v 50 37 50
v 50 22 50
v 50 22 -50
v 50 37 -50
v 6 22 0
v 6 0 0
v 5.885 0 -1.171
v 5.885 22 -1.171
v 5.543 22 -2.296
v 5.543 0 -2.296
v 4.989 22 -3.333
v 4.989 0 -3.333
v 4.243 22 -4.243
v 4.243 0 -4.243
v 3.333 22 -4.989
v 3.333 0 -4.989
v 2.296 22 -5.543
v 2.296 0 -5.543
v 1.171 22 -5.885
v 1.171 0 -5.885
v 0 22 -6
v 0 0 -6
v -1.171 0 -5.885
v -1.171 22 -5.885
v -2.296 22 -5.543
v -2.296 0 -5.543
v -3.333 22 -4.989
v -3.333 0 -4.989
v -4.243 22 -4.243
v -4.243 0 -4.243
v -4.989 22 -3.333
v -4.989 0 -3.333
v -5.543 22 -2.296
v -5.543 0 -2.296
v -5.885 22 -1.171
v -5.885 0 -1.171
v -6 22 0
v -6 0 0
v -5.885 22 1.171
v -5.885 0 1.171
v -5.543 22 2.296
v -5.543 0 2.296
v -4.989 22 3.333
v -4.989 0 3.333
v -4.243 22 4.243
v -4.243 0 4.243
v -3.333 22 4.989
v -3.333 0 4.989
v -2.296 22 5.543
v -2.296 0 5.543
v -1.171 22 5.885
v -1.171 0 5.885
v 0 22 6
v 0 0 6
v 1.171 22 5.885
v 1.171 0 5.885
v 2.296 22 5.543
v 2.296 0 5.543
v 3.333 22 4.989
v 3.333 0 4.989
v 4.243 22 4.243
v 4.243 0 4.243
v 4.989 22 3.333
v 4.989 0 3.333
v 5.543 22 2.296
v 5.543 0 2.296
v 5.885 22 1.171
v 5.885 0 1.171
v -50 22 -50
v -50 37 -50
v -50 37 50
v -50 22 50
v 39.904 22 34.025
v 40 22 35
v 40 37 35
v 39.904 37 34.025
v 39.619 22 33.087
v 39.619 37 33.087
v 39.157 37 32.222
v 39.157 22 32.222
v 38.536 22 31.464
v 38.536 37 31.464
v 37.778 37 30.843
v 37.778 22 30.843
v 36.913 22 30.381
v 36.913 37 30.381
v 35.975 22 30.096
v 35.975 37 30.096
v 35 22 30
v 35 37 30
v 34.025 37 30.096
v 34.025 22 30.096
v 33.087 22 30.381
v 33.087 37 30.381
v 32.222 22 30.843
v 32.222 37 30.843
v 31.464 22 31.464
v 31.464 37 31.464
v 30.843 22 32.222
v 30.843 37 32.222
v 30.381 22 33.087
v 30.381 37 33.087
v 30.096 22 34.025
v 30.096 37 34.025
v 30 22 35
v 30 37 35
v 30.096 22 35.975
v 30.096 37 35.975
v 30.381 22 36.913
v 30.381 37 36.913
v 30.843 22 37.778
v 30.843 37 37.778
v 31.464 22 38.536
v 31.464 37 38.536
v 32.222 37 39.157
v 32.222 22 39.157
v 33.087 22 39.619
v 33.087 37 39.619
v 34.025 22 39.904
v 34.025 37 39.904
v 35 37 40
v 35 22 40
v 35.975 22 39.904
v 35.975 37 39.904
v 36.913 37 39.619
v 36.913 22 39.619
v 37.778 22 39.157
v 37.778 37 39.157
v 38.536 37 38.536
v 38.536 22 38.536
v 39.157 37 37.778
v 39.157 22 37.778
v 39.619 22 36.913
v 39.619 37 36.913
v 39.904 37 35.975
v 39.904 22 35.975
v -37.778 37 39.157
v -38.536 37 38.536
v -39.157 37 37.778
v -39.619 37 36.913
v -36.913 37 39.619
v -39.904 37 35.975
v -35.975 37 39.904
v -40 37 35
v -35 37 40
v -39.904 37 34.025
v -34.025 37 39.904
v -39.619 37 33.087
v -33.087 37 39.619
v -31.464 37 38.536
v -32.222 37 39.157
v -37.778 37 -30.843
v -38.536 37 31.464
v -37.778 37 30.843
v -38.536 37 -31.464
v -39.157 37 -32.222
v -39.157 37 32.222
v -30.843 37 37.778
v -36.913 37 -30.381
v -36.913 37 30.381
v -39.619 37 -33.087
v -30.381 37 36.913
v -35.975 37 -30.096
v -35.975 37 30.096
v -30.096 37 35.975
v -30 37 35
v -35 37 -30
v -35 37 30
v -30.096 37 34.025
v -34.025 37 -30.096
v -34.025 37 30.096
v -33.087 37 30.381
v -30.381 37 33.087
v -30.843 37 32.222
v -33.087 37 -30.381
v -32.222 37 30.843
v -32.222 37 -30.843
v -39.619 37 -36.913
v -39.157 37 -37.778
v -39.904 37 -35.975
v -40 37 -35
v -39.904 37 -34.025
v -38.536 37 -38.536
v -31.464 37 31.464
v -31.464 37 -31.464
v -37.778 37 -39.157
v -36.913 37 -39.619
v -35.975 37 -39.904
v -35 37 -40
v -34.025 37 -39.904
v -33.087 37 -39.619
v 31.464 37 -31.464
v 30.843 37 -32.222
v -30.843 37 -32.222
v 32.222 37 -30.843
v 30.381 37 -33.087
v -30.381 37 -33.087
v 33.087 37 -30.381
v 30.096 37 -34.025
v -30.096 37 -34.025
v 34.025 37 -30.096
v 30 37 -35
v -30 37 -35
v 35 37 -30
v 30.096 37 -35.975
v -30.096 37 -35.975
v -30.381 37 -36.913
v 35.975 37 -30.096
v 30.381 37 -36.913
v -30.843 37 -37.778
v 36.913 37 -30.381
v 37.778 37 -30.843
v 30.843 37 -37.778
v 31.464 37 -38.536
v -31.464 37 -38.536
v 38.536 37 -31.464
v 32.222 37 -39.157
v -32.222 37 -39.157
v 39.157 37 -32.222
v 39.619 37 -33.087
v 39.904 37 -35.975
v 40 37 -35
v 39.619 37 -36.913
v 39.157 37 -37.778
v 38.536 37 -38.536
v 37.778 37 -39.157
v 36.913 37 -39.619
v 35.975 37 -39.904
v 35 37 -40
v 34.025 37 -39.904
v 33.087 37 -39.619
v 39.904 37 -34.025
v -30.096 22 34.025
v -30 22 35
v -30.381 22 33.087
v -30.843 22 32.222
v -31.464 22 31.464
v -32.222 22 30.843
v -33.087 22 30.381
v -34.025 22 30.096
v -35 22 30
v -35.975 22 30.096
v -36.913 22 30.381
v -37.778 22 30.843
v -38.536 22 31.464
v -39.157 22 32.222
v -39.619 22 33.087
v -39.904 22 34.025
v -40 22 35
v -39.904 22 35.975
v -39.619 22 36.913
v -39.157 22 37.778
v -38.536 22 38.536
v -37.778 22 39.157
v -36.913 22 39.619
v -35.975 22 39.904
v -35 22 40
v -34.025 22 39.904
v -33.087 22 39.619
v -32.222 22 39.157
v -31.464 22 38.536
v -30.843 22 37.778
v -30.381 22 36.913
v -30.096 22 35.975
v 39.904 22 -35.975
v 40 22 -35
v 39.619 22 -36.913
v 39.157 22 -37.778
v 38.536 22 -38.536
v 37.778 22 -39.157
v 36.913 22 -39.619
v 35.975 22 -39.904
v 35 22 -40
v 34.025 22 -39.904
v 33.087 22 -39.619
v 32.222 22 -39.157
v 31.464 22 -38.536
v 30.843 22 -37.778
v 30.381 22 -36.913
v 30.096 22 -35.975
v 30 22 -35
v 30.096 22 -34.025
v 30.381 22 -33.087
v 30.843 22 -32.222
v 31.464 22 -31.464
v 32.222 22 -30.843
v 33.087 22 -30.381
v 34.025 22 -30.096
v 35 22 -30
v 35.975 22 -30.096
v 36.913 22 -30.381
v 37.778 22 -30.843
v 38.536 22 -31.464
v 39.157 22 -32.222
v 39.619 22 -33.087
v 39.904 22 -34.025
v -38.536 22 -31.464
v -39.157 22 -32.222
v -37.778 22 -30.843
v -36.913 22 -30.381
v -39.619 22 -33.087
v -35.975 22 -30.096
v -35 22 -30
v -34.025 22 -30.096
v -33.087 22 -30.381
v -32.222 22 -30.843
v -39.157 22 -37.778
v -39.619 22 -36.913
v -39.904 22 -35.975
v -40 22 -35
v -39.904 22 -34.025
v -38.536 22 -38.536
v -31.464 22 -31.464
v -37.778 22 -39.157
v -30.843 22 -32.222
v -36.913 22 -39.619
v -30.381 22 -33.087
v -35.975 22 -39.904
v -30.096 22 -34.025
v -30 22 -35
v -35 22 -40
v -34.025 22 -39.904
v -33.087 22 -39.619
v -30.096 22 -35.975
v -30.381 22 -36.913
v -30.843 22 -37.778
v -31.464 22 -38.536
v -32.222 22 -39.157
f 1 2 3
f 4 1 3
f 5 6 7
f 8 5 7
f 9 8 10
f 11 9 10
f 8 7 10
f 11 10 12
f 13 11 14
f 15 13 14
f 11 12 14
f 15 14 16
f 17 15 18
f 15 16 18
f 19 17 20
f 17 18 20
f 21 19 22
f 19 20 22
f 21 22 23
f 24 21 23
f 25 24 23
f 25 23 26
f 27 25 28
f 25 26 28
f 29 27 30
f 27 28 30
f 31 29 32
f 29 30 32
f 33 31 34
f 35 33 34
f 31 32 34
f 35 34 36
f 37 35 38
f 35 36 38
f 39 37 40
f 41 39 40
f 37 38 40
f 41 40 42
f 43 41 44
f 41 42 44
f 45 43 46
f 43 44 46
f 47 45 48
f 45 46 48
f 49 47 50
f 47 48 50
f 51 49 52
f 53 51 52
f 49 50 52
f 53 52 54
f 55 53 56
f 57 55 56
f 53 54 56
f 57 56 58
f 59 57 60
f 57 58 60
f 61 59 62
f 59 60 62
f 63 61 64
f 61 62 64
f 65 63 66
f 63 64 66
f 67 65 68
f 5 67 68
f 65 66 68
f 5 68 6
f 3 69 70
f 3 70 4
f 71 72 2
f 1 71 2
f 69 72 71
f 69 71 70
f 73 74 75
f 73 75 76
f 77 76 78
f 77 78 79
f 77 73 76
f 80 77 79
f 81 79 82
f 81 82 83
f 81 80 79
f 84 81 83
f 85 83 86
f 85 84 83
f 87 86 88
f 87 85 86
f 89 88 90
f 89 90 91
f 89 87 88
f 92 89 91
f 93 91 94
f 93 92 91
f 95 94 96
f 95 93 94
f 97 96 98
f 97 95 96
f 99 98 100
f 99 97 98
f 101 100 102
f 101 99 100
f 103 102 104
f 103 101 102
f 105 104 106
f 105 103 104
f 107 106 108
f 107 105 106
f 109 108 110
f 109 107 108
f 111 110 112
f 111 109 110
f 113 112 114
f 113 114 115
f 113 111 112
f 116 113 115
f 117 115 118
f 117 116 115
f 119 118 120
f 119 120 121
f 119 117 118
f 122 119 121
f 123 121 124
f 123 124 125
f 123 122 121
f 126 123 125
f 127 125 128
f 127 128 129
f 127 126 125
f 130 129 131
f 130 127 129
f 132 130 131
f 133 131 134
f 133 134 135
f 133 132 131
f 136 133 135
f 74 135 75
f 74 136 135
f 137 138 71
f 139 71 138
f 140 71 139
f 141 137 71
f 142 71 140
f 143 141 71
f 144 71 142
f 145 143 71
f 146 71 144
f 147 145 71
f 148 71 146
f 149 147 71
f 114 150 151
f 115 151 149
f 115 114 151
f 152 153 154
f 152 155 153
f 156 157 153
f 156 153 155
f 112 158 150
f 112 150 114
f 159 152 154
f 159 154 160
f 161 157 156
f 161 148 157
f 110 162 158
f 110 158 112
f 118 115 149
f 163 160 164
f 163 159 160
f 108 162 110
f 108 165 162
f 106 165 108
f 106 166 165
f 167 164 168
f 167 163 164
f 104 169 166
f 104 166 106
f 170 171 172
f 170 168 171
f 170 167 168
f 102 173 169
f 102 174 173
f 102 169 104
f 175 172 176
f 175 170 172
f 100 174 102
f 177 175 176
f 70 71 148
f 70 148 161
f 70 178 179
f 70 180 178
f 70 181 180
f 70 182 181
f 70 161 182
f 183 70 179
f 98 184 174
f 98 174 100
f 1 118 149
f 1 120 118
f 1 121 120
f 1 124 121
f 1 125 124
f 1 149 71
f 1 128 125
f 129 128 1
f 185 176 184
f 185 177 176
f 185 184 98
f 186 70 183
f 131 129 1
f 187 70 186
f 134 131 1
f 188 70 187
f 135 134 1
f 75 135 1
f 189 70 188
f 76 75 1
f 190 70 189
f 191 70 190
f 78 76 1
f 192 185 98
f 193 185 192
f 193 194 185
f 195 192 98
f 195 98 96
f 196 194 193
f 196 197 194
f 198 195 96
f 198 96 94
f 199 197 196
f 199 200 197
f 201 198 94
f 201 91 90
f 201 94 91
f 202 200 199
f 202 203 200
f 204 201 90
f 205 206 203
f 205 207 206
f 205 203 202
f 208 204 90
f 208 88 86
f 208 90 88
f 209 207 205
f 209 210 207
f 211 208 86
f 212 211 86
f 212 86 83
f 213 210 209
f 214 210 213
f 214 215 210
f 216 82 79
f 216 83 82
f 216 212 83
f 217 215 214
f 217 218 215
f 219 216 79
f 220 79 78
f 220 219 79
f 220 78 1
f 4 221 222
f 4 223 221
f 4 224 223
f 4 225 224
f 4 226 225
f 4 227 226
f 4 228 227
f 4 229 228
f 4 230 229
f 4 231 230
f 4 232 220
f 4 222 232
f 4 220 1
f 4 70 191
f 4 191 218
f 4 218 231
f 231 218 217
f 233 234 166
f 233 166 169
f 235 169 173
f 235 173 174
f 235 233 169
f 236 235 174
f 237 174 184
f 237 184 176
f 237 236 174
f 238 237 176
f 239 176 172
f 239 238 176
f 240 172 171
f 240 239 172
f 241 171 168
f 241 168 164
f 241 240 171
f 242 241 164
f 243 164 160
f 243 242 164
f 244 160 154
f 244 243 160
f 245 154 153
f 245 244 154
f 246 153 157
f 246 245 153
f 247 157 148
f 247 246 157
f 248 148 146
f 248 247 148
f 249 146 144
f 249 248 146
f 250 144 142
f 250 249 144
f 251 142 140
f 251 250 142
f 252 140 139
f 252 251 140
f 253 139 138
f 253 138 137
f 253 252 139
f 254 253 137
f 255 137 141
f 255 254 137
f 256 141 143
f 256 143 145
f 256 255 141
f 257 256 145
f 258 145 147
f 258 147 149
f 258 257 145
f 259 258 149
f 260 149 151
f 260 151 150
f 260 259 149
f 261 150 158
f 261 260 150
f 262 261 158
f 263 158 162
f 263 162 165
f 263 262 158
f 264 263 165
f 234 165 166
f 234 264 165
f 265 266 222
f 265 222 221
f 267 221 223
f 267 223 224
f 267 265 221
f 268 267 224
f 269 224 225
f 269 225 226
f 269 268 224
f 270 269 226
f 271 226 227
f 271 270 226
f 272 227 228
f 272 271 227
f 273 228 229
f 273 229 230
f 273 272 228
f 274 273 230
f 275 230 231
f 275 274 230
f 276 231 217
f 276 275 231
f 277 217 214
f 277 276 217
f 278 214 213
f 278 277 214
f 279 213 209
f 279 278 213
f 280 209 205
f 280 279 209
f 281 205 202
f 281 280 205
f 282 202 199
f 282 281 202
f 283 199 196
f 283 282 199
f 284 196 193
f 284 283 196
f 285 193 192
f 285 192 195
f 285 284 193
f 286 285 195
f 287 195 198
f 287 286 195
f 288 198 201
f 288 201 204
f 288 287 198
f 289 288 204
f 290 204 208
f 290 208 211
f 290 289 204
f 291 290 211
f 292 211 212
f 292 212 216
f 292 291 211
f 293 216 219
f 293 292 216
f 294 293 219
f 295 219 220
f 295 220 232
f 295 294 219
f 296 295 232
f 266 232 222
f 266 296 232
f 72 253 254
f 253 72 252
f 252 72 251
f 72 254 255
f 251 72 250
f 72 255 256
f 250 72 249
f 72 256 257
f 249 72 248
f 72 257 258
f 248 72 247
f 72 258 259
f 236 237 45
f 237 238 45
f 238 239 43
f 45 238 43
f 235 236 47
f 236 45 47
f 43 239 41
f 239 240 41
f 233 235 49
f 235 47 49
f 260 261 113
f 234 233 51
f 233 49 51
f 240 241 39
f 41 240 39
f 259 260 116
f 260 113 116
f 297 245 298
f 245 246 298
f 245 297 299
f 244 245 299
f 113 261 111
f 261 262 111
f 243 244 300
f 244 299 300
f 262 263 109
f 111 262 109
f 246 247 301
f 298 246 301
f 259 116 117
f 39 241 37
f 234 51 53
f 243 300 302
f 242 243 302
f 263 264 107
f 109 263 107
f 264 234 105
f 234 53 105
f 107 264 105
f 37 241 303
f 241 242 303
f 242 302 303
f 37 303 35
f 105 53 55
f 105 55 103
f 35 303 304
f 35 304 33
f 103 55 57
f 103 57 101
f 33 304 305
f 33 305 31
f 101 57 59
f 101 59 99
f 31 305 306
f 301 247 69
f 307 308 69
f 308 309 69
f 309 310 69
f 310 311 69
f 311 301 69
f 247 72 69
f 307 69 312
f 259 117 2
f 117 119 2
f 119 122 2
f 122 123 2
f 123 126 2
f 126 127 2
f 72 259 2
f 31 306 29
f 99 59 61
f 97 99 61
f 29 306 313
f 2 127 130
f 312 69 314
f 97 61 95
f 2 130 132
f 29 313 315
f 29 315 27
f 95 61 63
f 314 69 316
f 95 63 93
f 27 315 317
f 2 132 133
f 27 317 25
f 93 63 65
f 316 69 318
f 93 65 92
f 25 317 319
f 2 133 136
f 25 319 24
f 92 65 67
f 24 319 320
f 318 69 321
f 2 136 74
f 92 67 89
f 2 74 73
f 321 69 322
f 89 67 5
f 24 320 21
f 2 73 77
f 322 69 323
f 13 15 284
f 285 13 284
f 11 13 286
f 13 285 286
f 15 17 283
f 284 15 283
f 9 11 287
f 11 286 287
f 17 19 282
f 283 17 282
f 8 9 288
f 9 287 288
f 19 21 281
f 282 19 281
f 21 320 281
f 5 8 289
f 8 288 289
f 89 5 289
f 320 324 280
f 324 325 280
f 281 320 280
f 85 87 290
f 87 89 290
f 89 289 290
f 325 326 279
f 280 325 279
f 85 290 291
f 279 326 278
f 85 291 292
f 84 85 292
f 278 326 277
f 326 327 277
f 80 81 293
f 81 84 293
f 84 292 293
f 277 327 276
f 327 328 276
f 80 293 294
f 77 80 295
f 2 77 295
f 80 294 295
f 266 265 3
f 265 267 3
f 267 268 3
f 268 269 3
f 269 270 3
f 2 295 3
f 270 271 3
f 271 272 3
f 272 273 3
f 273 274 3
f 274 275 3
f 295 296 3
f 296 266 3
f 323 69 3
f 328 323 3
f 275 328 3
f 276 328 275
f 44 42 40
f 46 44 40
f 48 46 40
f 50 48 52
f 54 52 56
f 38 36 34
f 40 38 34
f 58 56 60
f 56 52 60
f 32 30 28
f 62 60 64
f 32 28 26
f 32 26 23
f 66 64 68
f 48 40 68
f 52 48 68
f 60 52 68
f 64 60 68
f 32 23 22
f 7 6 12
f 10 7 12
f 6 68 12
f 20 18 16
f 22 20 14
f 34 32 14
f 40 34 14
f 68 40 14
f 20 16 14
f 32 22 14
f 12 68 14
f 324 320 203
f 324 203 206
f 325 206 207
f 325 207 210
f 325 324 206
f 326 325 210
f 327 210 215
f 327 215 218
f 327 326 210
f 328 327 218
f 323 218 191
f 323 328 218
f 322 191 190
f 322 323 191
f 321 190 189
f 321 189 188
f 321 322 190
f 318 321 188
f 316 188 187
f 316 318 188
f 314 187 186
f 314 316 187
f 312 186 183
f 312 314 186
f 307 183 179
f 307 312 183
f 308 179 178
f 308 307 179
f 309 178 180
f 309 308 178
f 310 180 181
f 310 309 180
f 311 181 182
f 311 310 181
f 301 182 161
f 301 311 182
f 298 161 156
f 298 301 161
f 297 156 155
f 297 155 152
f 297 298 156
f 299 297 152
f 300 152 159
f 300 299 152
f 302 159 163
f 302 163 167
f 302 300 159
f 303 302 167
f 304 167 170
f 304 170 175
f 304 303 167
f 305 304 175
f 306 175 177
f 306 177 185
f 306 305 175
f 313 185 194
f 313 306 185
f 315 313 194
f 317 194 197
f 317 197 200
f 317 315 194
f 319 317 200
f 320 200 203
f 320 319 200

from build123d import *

# Parameters (mm, degrees)
SKETCH1_R           = 6
BOSS_EXTRUDE1_DEPTH = 22
SKETCH2_W           = 100
SKETCH2_H           = 100
SKETCH2_R           = 5
BOSS_EXTRUDE2_DEPTH = 15


with BuildPart() as part:
    # Sketch1 → Boss-Extrude1 (new body)
    with BuildSketch(Plane(origin=(0, 0, 0), x_dir=(1, 0, 0), z_dir=(0, 1, 0))):
        Circle(SKETCH1_R)
    extrude(amount=BOSS_EXTRUDE1_DEPTH)

    # Sketch2 → Boss-Extrude2 (add)
    with BuildSketch(Plane(origin=(0, 22, 0), x_dir=(1, 0, 0), z_dir=(0, 1, 0))):
        Rectangle(SKETCH2_W, SKETCH2_H)
        with Locations((-35, 35)):
            Circle(SKETCH2_R, mode=Mode.SUBTRACT)
        with Locations((35, 35)):
            Circle(SKETCH2_R, mode=Mode.SUBTRACT)
        with Locations((35, -35)):
            Circle(SKETCH2_R, mode=Mode.SUBTRACT)
        with Locations((-35, -35)):
            Circle(SKETCH2_R, mode=Mode.SUBTRACT)
    extrude(amount=BOSS_EXTRUDE2_DEPTH)


solid = part.part
